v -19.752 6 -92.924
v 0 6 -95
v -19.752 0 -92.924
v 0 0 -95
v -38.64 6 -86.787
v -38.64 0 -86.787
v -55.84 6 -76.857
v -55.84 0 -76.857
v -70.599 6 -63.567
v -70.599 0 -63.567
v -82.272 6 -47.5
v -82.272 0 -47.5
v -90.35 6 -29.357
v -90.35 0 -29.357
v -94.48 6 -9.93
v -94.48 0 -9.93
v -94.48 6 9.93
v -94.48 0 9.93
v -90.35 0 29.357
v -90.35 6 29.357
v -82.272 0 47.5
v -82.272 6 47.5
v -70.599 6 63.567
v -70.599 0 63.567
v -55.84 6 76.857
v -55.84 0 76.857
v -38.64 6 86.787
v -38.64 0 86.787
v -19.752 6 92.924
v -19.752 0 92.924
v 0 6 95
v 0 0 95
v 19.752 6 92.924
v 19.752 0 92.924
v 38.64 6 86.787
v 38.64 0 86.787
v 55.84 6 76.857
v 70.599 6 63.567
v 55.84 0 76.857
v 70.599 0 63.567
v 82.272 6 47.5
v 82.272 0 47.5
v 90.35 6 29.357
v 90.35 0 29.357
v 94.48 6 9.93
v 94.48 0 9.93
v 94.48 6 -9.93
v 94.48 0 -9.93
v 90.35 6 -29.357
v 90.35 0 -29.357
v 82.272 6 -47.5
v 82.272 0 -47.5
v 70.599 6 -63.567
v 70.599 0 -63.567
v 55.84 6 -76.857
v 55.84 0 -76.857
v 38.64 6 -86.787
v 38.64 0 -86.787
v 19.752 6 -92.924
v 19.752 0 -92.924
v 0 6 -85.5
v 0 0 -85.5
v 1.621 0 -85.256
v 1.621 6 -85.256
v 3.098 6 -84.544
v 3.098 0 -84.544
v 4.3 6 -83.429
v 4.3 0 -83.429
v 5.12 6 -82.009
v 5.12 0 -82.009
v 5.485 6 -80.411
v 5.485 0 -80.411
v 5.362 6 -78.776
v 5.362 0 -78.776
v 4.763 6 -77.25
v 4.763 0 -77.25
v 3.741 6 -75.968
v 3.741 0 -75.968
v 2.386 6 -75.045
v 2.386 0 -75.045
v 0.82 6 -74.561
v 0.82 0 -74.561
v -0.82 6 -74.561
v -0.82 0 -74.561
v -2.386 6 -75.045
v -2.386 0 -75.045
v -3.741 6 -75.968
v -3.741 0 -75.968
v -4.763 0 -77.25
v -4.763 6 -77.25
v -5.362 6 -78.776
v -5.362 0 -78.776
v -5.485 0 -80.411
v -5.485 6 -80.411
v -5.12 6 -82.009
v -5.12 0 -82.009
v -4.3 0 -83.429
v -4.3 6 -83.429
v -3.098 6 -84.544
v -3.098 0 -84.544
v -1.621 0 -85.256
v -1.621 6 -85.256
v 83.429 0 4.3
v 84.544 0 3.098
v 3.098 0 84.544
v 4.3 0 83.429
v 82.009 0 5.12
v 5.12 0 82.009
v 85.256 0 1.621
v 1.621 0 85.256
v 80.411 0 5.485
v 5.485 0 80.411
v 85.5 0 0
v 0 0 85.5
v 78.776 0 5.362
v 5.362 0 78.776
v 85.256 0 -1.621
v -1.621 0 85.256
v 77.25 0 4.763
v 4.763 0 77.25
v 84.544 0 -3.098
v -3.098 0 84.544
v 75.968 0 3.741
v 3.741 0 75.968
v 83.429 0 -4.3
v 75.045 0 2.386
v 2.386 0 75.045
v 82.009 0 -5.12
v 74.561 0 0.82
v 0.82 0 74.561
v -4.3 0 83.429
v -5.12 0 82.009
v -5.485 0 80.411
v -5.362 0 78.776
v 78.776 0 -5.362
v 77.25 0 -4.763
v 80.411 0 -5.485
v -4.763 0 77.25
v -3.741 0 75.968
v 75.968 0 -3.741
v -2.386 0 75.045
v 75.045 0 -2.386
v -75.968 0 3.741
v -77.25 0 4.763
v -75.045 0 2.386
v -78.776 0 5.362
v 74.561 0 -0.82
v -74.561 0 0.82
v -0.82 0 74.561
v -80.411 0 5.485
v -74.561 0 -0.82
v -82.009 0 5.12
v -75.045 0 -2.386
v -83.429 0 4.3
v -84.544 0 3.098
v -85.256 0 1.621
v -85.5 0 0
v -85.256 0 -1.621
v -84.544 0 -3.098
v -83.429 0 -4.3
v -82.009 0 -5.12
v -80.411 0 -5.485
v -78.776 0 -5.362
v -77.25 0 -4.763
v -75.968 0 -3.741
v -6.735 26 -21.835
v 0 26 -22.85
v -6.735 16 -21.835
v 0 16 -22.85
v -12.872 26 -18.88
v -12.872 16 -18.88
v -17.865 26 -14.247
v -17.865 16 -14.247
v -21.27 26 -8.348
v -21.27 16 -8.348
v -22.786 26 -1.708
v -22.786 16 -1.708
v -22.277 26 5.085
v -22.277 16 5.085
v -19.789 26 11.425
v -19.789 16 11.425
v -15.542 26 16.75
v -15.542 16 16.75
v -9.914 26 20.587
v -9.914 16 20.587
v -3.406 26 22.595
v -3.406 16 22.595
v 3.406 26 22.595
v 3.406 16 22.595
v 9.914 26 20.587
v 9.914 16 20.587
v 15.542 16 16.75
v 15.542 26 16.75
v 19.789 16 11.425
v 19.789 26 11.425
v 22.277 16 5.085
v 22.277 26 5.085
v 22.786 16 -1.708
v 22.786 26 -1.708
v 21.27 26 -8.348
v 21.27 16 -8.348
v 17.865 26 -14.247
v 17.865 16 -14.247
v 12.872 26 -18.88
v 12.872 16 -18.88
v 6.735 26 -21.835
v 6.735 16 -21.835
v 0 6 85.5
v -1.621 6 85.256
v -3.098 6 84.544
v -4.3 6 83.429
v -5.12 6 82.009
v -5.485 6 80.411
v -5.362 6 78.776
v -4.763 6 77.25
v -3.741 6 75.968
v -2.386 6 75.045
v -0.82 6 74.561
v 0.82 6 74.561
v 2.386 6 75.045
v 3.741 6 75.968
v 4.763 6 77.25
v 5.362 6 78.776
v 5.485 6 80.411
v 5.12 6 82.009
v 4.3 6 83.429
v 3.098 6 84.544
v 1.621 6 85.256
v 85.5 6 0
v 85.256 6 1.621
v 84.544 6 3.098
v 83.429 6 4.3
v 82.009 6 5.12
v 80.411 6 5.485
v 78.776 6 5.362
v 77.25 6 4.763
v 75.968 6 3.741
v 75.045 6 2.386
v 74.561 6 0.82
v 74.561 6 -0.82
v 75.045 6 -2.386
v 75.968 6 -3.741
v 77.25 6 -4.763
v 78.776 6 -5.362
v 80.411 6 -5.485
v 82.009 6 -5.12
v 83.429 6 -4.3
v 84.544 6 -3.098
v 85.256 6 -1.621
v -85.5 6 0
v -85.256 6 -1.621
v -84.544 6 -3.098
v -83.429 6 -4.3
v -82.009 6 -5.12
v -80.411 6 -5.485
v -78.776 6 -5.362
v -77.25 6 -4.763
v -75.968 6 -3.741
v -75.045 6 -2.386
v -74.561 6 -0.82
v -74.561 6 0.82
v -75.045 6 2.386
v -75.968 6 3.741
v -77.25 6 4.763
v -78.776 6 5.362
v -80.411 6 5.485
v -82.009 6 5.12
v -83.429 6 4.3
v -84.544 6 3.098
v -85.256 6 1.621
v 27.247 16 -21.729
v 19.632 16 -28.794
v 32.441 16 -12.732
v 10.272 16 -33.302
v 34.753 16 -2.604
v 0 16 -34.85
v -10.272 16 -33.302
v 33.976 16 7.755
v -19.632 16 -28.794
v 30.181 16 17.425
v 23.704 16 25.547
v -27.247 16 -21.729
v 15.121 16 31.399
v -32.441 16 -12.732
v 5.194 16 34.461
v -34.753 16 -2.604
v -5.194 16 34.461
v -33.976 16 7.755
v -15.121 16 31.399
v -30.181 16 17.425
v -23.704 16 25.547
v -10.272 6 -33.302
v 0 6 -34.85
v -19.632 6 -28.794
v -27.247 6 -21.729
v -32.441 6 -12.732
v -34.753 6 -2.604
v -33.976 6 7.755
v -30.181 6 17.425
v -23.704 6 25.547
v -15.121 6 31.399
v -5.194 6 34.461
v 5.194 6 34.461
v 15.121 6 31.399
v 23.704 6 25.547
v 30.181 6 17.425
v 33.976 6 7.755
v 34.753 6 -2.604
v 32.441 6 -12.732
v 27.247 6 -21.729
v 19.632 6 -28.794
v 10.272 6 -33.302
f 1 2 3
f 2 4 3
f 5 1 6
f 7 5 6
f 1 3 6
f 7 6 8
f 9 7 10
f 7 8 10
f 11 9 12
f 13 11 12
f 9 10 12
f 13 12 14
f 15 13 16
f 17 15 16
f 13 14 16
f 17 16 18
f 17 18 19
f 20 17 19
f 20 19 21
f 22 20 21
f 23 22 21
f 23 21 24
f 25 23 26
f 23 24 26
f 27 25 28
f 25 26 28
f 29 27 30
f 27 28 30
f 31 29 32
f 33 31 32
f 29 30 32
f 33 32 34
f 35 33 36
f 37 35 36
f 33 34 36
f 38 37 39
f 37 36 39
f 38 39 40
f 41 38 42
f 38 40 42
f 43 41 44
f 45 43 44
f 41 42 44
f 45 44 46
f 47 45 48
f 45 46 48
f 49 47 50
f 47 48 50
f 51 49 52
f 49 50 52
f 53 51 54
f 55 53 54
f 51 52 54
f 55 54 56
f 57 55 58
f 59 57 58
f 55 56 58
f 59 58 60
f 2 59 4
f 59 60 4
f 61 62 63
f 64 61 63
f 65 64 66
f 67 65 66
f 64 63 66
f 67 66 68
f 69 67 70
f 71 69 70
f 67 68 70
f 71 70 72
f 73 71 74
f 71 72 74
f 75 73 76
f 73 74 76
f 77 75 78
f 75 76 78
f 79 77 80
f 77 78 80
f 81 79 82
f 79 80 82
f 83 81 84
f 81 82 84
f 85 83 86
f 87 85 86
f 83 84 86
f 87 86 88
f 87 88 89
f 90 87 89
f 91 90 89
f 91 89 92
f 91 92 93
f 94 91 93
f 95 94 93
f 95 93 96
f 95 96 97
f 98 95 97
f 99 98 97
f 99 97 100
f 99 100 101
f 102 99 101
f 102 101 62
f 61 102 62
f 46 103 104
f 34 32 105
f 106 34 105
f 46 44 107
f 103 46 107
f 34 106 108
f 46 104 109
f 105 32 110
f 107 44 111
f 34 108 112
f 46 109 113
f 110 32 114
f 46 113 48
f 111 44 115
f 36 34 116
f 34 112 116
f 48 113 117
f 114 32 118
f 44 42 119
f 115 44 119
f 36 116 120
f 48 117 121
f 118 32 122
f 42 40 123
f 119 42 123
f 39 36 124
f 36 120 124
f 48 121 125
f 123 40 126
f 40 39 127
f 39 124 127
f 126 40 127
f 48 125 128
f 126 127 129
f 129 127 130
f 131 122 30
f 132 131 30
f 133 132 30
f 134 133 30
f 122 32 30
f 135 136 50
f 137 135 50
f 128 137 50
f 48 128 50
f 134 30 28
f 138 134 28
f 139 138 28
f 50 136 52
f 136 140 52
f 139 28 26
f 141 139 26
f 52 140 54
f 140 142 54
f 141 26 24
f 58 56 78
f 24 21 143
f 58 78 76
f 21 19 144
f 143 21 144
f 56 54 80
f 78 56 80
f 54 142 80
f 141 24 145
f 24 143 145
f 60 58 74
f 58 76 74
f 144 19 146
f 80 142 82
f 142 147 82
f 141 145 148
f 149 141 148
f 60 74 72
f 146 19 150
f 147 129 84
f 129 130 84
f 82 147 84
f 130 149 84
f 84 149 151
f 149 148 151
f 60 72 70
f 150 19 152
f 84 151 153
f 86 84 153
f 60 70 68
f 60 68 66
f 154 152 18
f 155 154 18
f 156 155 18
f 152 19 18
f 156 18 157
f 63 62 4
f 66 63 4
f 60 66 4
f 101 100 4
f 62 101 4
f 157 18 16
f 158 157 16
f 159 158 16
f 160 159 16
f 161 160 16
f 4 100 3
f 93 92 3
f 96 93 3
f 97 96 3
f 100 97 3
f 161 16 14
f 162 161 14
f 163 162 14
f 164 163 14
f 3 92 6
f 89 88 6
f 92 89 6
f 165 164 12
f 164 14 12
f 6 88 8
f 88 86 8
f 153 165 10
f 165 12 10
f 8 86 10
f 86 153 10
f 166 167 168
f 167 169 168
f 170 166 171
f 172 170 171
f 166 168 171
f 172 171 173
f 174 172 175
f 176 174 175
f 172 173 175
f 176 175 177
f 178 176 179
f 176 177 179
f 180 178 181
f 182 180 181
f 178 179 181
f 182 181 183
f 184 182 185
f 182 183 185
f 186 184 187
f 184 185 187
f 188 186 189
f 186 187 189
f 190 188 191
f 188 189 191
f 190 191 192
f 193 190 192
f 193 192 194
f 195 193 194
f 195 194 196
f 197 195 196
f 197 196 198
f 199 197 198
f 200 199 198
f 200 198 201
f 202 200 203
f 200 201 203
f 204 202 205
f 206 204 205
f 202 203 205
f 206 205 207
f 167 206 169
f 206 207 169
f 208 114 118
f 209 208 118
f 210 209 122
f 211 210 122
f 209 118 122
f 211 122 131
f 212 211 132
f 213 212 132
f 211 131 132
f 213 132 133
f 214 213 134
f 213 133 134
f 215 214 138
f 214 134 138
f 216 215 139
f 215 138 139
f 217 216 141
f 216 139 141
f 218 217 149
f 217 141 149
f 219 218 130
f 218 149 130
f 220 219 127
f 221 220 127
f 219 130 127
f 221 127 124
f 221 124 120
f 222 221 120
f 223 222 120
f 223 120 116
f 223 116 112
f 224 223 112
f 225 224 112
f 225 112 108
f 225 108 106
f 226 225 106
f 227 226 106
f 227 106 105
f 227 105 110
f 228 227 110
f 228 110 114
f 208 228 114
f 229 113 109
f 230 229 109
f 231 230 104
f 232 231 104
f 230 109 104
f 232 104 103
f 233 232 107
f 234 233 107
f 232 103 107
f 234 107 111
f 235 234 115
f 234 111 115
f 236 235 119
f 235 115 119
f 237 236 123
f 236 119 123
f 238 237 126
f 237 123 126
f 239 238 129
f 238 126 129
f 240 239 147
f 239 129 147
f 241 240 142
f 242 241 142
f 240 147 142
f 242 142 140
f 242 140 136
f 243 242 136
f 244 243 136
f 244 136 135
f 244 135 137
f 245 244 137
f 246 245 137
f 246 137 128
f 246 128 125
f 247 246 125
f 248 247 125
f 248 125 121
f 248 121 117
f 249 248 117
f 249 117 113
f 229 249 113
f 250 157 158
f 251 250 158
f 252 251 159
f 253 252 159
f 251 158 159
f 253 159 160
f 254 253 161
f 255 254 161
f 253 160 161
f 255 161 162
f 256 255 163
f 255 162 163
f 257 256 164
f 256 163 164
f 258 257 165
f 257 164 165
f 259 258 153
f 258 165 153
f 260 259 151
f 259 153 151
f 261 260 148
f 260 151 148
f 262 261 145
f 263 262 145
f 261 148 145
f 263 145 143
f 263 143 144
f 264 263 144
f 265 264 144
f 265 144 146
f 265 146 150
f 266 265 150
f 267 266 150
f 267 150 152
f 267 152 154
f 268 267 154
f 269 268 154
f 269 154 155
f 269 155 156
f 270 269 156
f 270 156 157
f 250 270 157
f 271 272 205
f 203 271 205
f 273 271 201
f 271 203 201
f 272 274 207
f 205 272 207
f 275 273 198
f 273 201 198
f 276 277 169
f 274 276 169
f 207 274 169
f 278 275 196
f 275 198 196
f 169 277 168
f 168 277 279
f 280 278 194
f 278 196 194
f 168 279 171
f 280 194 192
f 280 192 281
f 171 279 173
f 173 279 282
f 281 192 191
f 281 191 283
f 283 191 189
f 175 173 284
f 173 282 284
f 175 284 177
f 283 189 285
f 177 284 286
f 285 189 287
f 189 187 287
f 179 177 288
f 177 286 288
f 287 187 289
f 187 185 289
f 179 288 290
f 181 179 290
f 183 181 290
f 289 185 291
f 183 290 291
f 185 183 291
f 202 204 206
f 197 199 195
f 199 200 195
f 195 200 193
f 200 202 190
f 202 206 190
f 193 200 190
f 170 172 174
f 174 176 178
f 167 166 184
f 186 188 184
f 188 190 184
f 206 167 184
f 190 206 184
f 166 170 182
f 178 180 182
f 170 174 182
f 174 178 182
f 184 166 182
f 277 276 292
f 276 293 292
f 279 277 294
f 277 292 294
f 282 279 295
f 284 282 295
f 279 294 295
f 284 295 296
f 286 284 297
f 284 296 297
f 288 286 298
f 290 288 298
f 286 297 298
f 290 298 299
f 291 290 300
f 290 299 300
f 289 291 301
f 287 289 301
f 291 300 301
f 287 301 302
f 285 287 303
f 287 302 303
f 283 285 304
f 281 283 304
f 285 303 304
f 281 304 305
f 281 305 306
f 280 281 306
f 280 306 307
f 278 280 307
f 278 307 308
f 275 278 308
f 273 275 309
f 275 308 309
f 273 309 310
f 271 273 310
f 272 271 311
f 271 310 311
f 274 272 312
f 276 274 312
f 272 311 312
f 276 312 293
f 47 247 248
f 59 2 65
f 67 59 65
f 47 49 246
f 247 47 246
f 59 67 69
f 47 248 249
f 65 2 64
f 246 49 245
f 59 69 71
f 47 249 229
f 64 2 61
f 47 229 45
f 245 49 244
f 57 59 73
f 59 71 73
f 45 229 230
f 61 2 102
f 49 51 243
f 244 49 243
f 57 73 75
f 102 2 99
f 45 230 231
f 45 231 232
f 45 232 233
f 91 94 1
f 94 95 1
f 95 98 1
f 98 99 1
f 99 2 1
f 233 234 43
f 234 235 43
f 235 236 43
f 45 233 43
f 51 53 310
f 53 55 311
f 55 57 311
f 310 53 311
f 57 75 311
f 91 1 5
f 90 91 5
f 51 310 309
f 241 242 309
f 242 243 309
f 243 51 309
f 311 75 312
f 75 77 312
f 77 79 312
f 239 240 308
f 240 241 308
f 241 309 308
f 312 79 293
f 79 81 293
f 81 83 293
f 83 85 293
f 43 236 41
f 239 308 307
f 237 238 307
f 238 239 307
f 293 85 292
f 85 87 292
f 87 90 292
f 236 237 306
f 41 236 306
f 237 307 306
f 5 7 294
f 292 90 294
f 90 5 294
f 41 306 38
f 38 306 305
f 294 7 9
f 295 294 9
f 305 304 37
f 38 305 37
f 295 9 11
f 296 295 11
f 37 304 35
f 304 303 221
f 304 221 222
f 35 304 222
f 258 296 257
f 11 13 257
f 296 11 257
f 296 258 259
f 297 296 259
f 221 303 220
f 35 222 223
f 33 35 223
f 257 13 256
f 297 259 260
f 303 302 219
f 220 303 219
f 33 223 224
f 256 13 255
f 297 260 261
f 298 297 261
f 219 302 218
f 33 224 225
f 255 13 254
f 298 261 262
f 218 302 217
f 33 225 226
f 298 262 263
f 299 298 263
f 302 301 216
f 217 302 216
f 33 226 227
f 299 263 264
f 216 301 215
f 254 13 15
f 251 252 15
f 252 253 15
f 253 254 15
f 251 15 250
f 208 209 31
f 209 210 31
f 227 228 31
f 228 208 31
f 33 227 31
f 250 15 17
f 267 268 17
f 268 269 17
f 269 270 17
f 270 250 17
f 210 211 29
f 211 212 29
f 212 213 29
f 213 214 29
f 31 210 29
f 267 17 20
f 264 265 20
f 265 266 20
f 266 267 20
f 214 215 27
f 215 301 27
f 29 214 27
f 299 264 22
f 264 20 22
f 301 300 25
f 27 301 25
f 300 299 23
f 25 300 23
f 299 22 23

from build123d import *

# Parameters (mm, degrees)
M10_CLEARANCE_HOLE1_D = 11
CIRPATTERN1_COUNT     = 4


with BuildPart() as part:
    # Sketch5 → Revolve1 (revolve)
    with BuildSketch(Plane(origin=(0, 0, 0), x_dir=(0, 0, -1), z_dir=(1, 0, 0))):
        Polygon((34.85, 6), (95, 6), (95, 0), (0, 0), (0, 26), (22.85, 26), (22.85, 16), (34.85, 16), align=None)
    revolve(axis=Axis((0, 0, 0), (0, 1, 0)))

    # M10 Clearance Hole1 (through all)
    with Locations(Plane(origin=(0, 6, -80), x_dir=(0, 0, 1), z_dir=(0, 1, 0))):
        with Locations((0, 0)):
            m10_clearance_hole1 = Hole(M10_CLEARANCE_HOLE1_D / 2)

    # CirPattern1: M10 Clearance Hole1 ×4 about axis
    cirpattern1_axis = Axis((0, 0, 0), (0, 1, 0))
    for i in range(1, CIRPATTERN1_COUNT):
        add(m10_clearance_hole1.rotate(cirpattern1_axis, i * 360 / CIRPATTERN1_COUNT), mode=Mode.SUBTRACT)


solid = part.part
